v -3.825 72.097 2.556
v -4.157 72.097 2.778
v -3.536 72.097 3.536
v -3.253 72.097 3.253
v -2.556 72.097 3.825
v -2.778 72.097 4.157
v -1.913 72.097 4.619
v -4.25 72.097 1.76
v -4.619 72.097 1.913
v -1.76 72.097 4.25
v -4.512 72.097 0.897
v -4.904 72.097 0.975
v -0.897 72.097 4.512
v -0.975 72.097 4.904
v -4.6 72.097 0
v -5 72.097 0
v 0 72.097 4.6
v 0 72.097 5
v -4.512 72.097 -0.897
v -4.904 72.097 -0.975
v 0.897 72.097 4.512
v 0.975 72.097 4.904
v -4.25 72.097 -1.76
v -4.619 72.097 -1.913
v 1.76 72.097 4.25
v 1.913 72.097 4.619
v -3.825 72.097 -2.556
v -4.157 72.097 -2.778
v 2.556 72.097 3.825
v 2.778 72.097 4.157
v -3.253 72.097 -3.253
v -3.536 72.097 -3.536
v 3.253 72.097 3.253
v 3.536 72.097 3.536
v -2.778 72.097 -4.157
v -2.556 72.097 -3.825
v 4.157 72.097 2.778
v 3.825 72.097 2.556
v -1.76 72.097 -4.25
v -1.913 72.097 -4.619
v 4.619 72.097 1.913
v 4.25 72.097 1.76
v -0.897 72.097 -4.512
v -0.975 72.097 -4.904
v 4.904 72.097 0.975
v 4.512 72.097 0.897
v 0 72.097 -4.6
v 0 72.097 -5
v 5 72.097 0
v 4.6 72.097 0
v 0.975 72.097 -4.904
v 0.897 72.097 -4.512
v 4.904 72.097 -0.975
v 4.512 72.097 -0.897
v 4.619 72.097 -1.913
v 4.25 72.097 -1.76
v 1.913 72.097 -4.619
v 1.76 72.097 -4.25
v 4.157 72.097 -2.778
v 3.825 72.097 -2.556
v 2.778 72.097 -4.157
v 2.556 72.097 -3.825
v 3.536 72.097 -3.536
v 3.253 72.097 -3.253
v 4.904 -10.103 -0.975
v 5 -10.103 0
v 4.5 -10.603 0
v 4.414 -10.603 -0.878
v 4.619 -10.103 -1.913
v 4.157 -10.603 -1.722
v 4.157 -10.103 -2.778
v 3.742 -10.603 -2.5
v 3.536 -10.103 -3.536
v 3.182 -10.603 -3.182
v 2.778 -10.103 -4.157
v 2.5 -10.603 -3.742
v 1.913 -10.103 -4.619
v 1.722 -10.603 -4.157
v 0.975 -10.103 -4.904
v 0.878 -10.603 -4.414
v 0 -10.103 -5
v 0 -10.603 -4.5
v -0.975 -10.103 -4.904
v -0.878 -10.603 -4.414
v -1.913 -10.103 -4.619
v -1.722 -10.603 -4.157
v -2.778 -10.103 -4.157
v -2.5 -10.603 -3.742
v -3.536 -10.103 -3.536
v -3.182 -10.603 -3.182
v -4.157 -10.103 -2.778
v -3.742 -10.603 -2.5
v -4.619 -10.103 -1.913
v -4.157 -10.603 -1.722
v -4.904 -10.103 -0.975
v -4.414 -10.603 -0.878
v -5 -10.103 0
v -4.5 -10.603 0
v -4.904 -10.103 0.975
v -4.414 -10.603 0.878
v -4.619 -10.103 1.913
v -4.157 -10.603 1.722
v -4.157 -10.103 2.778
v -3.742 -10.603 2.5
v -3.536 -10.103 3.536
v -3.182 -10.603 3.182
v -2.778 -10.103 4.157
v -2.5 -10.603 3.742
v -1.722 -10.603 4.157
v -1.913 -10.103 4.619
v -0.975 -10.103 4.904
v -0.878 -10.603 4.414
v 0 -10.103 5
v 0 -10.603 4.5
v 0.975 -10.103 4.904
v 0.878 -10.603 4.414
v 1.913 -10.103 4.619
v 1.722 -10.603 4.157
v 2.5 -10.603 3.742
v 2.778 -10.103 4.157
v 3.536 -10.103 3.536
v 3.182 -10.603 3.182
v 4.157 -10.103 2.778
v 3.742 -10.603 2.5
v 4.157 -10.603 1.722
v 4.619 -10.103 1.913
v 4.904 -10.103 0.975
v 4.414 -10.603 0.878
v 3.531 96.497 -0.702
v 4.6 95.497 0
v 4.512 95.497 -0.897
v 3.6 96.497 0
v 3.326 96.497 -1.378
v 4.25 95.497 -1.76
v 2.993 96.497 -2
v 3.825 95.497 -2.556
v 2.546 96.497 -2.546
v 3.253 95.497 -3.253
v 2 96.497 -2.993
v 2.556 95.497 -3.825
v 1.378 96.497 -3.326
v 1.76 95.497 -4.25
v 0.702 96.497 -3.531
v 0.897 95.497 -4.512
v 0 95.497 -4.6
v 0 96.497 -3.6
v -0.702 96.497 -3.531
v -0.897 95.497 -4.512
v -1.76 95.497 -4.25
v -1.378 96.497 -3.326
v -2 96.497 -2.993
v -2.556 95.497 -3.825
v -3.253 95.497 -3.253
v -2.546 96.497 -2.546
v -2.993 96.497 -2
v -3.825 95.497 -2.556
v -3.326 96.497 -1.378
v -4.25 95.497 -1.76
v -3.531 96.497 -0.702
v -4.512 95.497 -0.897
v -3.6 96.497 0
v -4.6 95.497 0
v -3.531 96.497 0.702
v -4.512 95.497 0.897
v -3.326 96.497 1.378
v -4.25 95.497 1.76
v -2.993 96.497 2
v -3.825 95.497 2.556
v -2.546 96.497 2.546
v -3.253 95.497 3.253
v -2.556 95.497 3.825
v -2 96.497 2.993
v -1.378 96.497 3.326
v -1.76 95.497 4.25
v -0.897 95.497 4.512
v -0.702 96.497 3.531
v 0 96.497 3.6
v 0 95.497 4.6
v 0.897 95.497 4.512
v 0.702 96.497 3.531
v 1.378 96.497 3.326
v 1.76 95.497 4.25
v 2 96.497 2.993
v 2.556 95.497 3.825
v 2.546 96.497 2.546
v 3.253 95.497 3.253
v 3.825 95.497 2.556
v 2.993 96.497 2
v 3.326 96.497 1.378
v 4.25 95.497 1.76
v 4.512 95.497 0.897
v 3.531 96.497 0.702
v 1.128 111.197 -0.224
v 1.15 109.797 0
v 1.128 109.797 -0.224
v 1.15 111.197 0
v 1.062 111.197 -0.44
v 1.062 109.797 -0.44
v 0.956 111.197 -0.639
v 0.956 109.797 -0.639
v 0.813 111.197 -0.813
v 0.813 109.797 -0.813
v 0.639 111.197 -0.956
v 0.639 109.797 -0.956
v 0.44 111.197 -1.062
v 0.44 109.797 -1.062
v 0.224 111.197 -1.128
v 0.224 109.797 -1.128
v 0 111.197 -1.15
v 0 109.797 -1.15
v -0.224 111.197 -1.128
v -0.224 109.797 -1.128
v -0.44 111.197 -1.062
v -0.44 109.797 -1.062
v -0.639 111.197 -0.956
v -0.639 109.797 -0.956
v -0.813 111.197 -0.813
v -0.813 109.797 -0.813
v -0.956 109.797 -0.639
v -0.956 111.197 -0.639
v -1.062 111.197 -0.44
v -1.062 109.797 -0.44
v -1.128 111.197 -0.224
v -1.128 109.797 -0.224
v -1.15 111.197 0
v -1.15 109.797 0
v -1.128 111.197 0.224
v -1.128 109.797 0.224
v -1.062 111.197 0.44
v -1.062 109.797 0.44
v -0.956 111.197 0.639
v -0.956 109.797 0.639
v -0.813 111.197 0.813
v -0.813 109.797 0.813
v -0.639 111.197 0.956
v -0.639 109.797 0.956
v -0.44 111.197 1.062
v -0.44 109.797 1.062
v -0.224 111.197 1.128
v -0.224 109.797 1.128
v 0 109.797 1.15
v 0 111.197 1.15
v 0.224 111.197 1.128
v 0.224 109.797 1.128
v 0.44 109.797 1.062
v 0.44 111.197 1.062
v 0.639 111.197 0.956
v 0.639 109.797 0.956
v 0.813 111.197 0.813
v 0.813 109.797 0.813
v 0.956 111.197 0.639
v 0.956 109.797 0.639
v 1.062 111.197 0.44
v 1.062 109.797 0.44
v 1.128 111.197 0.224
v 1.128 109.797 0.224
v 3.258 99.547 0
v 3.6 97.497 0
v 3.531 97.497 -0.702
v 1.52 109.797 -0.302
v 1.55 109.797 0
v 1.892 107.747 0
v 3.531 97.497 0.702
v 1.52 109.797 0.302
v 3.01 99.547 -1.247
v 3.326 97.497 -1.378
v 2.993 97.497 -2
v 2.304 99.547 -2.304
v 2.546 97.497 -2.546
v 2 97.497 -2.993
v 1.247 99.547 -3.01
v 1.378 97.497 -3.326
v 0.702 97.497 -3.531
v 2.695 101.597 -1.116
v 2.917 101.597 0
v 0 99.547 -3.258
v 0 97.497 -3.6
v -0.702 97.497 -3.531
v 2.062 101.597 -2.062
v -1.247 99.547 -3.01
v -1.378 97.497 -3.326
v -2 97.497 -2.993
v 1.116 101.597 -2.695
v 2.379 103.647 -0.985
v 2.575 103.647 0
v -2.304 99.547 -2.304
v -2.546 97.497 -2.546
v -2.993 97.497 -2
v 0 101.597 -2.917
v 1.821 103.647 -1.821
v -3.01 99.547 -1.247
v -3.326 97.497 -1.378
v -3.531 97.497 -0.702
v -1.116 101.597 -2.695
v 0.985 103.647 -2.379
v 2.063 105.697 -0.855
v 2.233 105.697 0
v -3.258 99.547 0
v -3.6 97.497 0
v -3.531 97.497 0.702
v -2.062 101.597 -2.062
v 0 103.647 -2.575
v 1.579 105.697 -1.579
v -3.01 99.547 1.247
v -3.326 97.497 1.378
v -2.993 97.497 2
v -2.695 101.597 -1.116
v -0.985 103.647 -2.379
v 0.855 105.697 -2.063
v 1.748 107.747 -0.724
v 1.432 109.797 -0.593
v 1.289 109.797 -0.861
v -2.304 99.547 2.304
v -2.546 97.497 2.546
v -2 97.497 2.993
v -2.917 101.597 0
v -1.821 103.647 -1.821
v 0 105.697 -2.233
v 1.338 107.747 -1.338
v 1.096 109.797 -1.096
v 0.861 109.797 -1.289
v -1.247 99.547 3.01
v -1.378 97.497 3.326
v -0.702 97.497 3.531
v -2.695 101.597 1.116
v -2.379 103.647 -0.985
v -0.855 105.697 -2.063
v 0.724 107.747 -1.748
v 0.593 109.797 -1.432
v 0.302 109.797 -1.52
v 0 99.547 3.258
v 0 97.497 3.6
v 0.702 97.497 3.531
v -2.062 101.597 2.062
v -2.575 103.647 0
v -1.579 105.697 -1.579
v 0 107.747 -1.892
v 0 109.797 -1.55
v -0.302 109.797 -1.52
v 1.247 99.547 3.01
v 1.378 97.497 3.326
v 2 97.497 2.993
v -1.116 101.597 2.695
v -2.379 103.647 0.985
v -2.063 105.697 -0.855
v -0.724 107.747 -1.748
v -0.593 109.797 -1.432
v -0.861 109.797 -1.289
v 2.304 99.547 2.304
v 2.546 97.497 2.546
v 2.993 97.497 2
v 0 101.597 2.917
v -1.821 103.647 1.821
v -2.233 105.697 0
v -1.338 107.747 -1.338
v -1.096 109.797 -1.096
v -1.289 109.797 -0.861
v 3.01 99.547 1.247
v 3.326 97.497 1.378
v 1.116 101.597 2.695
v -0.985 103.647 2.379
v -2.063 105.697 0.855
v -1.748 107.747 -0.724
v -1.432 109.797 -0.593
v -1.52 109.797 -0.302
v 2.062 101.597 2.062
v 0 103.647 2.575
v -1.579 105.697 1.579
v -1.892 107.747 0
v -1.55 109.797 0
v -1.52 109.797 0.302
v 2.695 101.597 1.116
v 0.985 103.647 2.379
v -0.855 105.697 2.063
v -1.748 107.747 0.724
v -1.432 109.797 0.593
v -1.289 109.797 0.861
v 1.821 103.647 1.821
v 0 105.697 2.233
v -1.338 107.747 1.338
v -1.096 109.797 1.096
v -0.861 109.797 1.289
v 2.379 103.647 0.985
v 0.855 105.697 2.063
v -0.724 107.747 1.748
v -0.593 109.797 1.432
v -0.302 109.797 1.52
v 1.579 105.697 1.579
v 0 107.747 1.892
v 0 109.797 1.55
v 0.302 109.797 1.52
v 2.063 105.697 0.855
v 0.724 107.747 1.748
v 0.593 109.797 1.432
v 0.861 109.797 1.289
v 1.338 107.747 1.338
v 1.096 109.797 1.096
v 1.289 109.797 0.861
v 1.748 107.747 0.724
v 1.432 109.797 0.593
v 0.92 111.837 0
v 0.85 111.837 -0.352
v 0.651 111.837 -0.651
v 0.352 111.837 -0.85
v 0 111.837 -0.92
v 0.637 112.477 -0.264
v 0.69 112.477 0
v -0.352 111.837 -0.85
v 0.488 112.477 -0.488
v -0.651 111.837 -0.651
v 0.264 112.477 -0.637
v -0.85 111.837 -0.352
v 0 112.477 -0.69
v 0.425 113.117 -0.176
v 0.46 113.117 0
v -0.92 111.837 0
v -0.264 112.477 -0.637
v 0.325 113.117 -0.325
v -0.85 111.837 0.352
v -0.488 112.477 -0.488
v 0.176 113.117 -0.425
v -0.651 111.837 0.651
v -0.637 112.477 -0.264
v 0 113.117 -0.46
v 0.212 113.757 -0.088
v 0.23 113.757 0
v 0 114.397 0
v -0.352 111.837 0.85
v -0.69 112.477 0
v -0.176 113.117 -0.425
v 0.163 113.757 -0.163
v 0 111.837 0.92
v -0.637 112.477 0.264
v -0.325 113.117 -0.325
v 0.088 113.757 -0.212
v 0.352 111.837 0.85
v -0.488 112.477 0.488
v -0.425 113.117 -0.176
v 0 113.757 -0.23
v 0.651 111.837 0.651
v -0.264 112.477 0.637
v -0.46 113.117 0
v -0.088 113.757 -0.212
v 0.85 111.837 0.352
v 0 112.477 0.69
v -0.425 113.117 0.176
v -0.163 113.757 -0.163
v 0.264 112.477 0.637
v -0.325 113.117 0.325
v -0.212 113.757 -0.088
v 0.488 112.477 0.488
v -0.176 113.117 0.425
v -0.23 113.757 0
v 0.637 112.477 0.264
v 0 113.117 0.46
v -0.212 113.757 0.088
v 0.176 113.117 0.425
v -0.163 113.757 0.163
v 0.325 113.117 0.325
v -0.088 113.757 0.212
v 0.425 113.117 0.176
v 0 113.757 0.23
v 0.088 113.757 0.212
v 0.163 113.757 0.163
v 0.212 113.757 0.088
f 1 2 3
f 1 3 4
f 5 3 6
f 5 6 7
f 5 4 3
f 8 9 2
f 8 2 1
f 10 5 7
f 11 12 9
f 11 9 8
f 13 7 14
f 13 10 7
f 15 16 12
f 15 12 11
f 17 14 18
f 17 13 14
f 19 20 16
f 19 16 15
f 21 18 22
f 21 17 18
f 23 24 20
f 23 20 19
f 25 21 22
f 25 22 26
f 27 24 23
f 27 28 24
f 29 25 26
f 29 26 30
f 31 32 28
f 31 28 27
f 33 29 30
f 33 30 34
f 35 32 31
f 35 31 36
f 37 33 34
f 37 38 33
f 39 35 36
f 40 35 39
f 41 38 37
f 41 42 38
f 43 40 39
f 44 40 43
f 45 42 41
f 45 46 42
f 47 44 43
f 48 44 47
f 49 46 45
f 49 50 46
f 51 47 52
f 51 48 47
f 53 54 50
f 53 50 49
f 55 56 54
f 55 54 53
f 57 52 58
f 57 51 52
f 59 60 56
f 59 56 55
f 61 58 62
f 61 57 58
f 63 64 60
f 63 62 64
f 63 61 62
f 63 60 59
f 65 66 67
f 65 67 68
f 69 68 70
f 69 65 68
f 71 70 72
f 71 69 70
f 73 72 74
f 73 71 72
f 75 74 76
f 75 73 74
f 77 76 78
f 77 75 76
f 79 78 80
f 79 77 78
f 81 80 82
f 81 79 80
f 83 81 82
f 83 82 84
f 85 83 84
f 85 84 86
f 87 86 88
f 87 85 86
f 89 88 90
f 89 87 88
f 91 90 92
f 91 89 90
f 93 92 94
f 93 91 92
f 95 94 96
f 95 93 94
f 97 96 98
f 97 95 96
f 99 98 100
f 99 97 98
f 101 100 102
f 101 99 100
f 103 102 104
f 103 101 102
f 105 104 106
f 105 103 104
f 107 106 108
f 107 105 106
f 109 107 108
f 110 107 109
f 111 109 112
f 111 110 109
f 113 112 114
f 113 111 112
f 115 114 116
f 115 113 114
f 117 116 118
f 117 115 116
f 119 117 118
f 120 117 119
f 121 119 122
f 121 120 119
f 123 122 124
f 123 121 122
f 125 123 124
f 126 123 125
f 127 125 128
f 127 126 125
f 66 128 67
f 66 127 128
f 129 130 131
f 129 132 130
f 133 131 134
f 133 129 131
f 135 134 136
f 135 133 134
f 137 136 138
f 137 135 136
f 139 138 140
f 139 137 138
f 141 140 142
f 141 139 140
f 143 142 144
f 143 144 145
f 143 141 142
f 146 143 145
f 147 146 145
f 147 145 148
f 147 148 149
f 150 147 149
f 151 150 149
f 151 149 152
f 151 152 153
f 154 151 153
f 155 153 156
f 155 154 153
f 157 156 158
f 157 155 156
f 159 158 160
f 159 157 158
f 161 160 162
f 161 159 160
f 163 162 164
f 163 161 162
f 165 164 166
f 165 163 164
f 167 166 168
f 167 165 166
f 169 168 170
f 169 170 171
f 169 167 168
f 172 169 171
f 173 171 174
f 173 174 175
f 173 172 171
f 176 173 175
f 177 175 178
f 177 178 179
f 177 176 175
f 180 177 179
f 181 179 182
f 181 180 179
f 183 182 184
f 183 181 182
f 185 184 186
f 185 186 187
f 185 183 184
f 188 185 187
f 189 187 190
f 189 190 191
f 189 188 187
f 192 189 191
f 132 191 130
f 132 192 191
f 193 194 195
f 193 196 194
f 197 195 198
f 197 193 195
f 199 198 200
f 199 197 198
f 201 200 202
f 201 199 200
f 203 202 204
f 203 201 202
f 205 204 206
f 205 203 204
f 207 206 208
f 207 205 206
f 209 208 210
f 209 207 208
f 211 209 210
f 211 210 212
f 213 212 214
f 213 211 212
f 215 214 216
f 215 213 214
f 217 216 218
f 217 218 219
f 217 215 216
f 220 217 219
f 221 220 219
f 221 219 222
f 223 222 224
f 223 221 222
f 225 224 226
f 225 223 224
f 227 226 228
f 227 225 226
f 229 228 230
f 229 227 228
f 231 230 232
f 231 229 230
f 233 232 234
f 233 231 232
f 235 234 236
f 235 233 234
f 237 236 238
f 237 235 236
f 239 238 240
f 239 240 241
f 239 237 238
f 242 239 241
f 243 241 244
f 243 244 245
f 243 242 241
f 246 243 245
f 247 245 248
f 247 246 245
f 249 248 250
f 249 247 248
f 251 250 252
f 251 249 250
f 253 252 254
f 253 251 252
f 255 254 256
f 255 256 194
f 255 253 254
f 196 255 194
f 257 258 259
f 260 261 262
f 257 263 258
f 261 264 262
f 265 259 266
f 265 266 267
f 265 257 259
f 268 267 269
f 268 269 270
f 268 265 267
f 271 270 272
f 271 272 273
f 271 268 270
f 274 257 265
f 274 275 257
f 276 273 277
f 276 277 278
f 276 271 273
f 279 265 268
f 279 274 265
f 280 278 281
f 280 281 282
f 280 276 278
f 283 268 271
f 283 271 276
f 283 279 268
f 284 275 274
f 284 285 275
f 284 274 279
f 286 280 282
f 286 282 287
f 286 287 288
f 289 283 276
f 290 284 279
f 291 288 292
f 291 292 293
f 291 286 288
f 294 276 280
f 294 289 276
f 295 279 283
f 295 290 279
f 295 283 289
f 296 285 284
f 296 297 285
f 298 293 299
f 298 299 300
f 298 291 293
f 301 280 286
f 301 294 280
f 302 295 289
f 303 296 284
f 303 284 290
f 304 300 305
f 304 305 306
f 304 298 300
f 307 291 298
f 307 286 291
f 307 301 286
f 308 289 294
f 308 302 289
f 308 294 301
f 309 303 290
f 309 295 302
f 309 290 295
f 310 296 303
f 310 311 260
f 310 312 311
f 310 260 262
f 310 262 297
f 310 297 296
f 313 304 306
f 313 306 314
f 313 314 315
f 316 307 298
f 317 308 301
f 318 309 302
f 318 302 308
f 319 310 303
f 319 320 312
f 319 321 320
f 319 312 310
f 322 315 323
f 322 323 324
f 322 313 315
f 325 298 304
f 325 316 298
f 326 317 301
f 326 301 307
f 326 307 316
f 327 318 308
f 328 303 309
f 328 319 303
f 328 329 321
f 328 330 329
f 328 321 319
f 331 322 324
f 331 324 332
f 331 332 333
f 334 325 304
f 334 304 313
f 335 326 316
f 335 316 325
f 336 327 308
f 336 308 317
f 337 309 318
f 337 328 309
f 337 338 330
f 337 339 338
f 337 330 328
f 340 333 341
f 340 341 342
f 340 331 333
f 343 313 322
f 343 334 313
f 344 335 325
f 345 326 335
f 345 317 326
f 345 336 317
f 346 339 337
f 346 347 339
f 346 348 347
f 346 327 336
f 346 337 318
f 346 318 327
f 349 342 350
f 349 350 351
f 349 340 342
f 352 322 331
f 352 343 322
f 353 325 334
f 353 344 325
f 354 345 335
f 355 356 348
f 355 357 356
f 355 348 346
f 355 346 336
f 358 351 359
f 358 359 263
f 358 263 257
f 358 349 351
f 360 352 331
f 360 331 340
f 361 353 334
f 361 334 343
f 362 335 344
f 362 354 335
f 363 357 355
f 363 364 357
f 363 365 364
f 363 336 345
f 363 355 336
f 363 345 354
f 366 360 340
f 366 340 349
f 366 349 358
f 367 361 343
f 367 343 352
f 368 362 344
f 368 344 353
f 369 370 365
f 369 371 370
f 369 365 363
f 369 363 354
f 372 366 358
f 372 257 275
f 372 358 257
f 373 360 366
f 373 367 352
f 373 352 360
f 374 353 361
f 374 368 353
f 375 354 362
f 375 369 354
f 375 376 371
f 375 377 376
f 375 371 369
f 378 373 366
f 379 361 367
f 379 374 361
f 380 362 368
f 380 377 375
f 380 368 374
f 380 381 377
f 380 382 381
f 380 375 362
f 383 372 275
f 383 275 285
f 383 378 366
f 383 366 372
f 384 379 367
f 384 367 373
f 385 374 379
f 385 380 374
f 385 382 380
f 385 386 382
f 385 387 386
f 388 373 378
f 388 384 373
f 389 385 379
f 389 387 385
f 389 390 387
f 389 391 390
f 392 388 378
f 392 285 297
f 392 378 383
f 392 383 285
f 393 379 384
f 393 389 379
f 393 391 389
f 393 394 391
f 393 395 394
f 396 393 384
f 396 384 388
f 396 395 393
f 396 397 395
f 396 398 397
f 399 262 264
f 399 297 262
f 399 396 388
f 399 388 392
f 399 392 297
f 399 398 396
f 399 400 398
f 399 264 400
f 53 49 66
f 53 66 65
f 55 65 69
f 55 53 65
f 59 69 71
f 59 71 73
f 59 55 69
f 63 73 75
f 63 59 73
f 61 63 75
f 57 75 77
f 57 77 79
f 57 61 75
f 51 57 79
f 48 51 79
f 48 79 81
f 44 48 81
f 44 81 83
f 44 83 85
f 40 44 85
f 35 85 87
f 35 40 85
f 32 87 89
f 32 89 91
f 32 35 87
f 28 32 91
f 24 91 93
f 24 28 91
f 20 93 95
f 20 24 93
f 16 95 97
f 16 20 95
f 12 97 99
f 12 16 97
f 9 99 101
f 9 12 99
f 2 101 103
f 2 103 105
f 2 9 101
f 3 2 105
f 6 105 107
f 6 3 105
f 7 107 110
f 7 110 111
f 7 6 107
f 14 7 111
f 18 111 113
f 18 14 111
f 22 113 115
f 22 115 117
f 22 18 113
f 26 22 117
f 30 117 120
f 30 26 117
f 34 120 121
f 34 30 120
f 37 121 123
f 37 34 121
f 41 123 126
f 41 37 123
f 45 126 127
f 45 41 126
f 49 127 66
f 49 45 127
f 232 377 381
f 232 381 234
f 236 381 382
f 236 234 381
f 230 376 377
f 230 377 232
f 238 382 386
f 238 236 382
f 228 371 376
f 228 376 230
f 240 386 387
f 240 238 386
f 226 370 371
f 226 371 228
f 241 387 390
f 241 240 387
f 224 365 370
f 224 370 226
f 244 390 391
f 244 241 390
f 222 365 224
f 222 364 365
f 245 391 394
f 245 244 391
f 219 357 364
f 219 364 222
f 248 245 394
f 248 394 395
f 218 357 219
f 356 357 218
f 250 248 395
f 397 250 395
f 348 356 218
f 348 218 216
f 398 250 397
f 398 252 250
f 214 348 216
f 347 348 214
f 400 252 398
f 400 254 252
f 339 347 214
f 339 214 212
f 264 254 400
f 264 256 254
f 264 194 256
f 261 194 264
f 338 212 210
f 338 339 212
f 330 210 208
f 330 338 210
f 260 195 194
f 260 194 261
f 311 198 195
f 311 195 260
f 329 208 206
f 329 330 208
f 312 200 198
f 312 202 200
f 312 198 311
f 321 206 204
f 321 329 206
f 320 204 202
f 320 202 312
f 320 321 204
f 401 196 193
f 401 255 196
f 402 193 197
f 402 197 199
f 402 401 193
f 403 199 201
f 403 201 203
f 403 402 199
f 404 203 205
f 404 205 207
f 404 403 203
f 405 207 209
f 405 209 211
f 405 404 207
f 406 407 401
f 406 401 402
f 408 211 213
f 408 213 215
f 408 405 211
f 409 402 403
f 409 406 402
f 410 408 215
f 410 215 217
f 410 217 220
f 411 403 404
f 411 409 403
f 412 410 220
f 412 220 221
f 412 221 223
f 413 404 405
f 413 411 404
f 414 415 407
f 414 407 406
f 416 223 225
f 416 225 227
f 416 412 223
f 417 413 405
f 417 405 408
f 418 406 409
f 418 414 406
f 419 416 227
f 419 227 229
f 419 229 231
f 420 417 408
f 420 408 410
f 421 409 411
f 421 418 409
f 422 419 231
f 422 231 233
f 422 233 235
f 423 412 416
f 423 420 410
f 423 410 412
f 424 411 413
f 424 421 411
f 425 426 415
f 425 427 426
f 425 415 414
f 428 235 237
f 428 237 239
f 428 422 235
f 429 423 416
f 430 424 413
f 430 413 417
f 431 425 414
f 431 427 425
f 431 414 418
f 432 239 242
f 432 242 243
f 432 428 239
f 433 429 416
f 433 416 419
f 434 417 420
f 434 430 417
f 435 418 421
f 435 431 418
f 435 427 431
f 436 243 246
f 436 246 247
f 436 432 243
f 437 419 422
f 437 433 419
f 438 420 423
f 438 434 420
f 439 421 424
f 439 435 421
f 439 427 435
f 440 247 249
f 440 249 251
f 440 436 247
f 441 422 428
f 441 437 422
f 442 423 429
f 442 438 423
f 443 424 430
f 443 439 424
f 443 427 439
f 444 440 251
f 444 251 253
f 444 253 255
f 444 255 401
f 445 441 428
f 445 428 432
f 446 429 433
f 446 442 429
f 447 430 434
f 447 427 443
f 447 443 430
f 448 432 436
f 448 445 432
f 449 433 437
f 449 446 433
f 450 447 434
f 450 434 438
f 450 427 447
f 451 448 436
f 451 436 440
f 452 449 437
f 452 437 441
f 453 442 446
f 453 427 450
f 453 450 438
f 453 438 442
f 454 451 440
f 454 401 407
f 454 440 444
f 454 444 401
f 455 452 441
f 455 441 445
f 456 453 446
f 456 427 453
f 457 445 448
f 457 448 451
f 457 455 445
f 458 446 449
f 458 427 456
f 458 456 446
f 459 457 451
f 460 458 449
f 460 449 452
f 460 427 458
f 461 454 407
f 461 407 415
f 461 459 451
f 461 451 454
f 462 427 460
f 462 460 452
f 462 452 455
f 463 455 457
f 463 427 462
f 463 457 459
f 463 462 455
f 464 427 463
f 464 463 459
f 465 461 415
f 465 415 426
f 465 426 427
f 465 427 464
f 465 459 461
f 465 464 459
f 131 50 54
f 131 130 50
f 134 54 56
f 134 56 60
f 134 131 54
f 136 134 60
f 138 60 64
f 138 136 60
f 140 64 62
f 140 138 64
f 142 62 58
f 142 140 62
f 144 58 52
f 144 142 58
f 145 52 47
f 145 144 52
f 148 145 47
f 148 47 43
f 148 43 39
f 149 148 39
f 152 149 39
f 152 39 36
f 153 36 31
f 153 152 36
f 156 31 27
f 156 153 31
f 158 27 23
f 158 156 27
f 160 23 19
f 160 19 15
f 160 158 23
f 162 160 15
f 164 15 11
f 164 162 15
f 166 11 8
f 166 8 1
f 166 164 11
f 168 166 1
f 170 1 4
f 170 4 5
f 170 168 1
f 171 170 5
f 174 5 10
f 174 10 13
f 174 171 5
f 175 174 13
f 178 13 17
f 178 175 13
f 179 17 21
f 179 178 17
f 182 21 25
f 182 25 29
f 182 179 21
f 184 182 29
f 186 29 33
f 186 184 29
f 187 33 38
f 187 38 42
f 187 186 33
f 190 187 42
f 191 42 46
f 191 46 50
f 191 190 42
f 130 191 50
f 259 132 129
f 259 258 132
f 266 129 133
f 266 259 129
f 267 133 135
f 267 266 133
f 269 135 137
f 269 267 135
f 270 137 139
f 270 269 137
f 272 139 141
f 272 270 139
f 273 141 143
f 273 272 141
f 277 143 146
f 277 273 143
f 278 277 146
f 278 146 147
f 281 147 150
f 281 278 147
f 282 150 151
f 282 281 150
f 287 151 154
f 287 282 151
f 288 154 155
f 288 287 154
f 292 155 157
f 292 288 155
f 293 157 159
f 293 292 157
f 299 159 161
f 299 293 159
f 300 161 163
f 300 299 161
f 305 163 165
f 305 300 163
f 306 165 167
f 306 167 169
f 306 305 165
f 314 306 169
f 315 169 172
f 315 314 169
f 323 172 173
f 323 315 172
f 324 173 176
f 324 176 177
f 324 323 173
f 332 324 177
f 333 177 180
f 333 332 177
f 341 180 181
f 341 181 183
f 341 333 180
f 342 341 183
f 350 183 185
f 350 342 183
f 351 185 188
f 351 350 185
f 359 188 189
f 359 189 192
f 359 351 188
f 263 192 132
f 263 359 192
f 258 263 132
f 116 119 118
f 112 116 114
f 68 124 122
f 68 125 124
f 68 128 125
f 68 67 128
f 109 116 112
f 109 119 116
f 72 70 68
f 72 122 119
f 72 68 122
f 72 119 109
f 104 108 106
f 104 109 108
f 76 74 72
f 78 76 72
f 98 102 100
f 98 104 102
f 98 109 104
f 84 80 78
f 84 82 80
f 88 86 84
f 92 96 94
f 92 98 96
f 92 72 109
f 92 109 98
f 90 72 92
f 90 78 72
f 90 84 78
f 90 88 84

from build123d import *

# Parameters (mm, degrees)
CHAMFER_1_SIZE = 0.5


# Read off the part's stored shape, not the designer's step: 旋转1
with BuildPart() as part:
    # 旋转1 outline → 旋转1 (revolve)
    with BuildSketch(Plane.XY):
        Polygon((1.15, 111.197298964), (0, 114.397298964), (0, -10.602701036), (5, -10.602701036), (5, 72.097298964), (4.6, 72.097298964), (4.6, 95.497298964), (3.6, 96.497298964), (3.6, 97.497298964), (1.55, 109.797298964), (1.15, 109.797298964), align=None)
    revolve(axis=Axis((0, 0, 0), (0, 1, 0)))

    # 倒角1
    chamfer_1_edges = [part.edges().sort_by_distance(p)[0] for p in [
        (-5, -10.602701036, 0),
    ]]
    chamfer(chamfer_1_edges, length=CHAMFER_1_SIZE)


solid = part.part
